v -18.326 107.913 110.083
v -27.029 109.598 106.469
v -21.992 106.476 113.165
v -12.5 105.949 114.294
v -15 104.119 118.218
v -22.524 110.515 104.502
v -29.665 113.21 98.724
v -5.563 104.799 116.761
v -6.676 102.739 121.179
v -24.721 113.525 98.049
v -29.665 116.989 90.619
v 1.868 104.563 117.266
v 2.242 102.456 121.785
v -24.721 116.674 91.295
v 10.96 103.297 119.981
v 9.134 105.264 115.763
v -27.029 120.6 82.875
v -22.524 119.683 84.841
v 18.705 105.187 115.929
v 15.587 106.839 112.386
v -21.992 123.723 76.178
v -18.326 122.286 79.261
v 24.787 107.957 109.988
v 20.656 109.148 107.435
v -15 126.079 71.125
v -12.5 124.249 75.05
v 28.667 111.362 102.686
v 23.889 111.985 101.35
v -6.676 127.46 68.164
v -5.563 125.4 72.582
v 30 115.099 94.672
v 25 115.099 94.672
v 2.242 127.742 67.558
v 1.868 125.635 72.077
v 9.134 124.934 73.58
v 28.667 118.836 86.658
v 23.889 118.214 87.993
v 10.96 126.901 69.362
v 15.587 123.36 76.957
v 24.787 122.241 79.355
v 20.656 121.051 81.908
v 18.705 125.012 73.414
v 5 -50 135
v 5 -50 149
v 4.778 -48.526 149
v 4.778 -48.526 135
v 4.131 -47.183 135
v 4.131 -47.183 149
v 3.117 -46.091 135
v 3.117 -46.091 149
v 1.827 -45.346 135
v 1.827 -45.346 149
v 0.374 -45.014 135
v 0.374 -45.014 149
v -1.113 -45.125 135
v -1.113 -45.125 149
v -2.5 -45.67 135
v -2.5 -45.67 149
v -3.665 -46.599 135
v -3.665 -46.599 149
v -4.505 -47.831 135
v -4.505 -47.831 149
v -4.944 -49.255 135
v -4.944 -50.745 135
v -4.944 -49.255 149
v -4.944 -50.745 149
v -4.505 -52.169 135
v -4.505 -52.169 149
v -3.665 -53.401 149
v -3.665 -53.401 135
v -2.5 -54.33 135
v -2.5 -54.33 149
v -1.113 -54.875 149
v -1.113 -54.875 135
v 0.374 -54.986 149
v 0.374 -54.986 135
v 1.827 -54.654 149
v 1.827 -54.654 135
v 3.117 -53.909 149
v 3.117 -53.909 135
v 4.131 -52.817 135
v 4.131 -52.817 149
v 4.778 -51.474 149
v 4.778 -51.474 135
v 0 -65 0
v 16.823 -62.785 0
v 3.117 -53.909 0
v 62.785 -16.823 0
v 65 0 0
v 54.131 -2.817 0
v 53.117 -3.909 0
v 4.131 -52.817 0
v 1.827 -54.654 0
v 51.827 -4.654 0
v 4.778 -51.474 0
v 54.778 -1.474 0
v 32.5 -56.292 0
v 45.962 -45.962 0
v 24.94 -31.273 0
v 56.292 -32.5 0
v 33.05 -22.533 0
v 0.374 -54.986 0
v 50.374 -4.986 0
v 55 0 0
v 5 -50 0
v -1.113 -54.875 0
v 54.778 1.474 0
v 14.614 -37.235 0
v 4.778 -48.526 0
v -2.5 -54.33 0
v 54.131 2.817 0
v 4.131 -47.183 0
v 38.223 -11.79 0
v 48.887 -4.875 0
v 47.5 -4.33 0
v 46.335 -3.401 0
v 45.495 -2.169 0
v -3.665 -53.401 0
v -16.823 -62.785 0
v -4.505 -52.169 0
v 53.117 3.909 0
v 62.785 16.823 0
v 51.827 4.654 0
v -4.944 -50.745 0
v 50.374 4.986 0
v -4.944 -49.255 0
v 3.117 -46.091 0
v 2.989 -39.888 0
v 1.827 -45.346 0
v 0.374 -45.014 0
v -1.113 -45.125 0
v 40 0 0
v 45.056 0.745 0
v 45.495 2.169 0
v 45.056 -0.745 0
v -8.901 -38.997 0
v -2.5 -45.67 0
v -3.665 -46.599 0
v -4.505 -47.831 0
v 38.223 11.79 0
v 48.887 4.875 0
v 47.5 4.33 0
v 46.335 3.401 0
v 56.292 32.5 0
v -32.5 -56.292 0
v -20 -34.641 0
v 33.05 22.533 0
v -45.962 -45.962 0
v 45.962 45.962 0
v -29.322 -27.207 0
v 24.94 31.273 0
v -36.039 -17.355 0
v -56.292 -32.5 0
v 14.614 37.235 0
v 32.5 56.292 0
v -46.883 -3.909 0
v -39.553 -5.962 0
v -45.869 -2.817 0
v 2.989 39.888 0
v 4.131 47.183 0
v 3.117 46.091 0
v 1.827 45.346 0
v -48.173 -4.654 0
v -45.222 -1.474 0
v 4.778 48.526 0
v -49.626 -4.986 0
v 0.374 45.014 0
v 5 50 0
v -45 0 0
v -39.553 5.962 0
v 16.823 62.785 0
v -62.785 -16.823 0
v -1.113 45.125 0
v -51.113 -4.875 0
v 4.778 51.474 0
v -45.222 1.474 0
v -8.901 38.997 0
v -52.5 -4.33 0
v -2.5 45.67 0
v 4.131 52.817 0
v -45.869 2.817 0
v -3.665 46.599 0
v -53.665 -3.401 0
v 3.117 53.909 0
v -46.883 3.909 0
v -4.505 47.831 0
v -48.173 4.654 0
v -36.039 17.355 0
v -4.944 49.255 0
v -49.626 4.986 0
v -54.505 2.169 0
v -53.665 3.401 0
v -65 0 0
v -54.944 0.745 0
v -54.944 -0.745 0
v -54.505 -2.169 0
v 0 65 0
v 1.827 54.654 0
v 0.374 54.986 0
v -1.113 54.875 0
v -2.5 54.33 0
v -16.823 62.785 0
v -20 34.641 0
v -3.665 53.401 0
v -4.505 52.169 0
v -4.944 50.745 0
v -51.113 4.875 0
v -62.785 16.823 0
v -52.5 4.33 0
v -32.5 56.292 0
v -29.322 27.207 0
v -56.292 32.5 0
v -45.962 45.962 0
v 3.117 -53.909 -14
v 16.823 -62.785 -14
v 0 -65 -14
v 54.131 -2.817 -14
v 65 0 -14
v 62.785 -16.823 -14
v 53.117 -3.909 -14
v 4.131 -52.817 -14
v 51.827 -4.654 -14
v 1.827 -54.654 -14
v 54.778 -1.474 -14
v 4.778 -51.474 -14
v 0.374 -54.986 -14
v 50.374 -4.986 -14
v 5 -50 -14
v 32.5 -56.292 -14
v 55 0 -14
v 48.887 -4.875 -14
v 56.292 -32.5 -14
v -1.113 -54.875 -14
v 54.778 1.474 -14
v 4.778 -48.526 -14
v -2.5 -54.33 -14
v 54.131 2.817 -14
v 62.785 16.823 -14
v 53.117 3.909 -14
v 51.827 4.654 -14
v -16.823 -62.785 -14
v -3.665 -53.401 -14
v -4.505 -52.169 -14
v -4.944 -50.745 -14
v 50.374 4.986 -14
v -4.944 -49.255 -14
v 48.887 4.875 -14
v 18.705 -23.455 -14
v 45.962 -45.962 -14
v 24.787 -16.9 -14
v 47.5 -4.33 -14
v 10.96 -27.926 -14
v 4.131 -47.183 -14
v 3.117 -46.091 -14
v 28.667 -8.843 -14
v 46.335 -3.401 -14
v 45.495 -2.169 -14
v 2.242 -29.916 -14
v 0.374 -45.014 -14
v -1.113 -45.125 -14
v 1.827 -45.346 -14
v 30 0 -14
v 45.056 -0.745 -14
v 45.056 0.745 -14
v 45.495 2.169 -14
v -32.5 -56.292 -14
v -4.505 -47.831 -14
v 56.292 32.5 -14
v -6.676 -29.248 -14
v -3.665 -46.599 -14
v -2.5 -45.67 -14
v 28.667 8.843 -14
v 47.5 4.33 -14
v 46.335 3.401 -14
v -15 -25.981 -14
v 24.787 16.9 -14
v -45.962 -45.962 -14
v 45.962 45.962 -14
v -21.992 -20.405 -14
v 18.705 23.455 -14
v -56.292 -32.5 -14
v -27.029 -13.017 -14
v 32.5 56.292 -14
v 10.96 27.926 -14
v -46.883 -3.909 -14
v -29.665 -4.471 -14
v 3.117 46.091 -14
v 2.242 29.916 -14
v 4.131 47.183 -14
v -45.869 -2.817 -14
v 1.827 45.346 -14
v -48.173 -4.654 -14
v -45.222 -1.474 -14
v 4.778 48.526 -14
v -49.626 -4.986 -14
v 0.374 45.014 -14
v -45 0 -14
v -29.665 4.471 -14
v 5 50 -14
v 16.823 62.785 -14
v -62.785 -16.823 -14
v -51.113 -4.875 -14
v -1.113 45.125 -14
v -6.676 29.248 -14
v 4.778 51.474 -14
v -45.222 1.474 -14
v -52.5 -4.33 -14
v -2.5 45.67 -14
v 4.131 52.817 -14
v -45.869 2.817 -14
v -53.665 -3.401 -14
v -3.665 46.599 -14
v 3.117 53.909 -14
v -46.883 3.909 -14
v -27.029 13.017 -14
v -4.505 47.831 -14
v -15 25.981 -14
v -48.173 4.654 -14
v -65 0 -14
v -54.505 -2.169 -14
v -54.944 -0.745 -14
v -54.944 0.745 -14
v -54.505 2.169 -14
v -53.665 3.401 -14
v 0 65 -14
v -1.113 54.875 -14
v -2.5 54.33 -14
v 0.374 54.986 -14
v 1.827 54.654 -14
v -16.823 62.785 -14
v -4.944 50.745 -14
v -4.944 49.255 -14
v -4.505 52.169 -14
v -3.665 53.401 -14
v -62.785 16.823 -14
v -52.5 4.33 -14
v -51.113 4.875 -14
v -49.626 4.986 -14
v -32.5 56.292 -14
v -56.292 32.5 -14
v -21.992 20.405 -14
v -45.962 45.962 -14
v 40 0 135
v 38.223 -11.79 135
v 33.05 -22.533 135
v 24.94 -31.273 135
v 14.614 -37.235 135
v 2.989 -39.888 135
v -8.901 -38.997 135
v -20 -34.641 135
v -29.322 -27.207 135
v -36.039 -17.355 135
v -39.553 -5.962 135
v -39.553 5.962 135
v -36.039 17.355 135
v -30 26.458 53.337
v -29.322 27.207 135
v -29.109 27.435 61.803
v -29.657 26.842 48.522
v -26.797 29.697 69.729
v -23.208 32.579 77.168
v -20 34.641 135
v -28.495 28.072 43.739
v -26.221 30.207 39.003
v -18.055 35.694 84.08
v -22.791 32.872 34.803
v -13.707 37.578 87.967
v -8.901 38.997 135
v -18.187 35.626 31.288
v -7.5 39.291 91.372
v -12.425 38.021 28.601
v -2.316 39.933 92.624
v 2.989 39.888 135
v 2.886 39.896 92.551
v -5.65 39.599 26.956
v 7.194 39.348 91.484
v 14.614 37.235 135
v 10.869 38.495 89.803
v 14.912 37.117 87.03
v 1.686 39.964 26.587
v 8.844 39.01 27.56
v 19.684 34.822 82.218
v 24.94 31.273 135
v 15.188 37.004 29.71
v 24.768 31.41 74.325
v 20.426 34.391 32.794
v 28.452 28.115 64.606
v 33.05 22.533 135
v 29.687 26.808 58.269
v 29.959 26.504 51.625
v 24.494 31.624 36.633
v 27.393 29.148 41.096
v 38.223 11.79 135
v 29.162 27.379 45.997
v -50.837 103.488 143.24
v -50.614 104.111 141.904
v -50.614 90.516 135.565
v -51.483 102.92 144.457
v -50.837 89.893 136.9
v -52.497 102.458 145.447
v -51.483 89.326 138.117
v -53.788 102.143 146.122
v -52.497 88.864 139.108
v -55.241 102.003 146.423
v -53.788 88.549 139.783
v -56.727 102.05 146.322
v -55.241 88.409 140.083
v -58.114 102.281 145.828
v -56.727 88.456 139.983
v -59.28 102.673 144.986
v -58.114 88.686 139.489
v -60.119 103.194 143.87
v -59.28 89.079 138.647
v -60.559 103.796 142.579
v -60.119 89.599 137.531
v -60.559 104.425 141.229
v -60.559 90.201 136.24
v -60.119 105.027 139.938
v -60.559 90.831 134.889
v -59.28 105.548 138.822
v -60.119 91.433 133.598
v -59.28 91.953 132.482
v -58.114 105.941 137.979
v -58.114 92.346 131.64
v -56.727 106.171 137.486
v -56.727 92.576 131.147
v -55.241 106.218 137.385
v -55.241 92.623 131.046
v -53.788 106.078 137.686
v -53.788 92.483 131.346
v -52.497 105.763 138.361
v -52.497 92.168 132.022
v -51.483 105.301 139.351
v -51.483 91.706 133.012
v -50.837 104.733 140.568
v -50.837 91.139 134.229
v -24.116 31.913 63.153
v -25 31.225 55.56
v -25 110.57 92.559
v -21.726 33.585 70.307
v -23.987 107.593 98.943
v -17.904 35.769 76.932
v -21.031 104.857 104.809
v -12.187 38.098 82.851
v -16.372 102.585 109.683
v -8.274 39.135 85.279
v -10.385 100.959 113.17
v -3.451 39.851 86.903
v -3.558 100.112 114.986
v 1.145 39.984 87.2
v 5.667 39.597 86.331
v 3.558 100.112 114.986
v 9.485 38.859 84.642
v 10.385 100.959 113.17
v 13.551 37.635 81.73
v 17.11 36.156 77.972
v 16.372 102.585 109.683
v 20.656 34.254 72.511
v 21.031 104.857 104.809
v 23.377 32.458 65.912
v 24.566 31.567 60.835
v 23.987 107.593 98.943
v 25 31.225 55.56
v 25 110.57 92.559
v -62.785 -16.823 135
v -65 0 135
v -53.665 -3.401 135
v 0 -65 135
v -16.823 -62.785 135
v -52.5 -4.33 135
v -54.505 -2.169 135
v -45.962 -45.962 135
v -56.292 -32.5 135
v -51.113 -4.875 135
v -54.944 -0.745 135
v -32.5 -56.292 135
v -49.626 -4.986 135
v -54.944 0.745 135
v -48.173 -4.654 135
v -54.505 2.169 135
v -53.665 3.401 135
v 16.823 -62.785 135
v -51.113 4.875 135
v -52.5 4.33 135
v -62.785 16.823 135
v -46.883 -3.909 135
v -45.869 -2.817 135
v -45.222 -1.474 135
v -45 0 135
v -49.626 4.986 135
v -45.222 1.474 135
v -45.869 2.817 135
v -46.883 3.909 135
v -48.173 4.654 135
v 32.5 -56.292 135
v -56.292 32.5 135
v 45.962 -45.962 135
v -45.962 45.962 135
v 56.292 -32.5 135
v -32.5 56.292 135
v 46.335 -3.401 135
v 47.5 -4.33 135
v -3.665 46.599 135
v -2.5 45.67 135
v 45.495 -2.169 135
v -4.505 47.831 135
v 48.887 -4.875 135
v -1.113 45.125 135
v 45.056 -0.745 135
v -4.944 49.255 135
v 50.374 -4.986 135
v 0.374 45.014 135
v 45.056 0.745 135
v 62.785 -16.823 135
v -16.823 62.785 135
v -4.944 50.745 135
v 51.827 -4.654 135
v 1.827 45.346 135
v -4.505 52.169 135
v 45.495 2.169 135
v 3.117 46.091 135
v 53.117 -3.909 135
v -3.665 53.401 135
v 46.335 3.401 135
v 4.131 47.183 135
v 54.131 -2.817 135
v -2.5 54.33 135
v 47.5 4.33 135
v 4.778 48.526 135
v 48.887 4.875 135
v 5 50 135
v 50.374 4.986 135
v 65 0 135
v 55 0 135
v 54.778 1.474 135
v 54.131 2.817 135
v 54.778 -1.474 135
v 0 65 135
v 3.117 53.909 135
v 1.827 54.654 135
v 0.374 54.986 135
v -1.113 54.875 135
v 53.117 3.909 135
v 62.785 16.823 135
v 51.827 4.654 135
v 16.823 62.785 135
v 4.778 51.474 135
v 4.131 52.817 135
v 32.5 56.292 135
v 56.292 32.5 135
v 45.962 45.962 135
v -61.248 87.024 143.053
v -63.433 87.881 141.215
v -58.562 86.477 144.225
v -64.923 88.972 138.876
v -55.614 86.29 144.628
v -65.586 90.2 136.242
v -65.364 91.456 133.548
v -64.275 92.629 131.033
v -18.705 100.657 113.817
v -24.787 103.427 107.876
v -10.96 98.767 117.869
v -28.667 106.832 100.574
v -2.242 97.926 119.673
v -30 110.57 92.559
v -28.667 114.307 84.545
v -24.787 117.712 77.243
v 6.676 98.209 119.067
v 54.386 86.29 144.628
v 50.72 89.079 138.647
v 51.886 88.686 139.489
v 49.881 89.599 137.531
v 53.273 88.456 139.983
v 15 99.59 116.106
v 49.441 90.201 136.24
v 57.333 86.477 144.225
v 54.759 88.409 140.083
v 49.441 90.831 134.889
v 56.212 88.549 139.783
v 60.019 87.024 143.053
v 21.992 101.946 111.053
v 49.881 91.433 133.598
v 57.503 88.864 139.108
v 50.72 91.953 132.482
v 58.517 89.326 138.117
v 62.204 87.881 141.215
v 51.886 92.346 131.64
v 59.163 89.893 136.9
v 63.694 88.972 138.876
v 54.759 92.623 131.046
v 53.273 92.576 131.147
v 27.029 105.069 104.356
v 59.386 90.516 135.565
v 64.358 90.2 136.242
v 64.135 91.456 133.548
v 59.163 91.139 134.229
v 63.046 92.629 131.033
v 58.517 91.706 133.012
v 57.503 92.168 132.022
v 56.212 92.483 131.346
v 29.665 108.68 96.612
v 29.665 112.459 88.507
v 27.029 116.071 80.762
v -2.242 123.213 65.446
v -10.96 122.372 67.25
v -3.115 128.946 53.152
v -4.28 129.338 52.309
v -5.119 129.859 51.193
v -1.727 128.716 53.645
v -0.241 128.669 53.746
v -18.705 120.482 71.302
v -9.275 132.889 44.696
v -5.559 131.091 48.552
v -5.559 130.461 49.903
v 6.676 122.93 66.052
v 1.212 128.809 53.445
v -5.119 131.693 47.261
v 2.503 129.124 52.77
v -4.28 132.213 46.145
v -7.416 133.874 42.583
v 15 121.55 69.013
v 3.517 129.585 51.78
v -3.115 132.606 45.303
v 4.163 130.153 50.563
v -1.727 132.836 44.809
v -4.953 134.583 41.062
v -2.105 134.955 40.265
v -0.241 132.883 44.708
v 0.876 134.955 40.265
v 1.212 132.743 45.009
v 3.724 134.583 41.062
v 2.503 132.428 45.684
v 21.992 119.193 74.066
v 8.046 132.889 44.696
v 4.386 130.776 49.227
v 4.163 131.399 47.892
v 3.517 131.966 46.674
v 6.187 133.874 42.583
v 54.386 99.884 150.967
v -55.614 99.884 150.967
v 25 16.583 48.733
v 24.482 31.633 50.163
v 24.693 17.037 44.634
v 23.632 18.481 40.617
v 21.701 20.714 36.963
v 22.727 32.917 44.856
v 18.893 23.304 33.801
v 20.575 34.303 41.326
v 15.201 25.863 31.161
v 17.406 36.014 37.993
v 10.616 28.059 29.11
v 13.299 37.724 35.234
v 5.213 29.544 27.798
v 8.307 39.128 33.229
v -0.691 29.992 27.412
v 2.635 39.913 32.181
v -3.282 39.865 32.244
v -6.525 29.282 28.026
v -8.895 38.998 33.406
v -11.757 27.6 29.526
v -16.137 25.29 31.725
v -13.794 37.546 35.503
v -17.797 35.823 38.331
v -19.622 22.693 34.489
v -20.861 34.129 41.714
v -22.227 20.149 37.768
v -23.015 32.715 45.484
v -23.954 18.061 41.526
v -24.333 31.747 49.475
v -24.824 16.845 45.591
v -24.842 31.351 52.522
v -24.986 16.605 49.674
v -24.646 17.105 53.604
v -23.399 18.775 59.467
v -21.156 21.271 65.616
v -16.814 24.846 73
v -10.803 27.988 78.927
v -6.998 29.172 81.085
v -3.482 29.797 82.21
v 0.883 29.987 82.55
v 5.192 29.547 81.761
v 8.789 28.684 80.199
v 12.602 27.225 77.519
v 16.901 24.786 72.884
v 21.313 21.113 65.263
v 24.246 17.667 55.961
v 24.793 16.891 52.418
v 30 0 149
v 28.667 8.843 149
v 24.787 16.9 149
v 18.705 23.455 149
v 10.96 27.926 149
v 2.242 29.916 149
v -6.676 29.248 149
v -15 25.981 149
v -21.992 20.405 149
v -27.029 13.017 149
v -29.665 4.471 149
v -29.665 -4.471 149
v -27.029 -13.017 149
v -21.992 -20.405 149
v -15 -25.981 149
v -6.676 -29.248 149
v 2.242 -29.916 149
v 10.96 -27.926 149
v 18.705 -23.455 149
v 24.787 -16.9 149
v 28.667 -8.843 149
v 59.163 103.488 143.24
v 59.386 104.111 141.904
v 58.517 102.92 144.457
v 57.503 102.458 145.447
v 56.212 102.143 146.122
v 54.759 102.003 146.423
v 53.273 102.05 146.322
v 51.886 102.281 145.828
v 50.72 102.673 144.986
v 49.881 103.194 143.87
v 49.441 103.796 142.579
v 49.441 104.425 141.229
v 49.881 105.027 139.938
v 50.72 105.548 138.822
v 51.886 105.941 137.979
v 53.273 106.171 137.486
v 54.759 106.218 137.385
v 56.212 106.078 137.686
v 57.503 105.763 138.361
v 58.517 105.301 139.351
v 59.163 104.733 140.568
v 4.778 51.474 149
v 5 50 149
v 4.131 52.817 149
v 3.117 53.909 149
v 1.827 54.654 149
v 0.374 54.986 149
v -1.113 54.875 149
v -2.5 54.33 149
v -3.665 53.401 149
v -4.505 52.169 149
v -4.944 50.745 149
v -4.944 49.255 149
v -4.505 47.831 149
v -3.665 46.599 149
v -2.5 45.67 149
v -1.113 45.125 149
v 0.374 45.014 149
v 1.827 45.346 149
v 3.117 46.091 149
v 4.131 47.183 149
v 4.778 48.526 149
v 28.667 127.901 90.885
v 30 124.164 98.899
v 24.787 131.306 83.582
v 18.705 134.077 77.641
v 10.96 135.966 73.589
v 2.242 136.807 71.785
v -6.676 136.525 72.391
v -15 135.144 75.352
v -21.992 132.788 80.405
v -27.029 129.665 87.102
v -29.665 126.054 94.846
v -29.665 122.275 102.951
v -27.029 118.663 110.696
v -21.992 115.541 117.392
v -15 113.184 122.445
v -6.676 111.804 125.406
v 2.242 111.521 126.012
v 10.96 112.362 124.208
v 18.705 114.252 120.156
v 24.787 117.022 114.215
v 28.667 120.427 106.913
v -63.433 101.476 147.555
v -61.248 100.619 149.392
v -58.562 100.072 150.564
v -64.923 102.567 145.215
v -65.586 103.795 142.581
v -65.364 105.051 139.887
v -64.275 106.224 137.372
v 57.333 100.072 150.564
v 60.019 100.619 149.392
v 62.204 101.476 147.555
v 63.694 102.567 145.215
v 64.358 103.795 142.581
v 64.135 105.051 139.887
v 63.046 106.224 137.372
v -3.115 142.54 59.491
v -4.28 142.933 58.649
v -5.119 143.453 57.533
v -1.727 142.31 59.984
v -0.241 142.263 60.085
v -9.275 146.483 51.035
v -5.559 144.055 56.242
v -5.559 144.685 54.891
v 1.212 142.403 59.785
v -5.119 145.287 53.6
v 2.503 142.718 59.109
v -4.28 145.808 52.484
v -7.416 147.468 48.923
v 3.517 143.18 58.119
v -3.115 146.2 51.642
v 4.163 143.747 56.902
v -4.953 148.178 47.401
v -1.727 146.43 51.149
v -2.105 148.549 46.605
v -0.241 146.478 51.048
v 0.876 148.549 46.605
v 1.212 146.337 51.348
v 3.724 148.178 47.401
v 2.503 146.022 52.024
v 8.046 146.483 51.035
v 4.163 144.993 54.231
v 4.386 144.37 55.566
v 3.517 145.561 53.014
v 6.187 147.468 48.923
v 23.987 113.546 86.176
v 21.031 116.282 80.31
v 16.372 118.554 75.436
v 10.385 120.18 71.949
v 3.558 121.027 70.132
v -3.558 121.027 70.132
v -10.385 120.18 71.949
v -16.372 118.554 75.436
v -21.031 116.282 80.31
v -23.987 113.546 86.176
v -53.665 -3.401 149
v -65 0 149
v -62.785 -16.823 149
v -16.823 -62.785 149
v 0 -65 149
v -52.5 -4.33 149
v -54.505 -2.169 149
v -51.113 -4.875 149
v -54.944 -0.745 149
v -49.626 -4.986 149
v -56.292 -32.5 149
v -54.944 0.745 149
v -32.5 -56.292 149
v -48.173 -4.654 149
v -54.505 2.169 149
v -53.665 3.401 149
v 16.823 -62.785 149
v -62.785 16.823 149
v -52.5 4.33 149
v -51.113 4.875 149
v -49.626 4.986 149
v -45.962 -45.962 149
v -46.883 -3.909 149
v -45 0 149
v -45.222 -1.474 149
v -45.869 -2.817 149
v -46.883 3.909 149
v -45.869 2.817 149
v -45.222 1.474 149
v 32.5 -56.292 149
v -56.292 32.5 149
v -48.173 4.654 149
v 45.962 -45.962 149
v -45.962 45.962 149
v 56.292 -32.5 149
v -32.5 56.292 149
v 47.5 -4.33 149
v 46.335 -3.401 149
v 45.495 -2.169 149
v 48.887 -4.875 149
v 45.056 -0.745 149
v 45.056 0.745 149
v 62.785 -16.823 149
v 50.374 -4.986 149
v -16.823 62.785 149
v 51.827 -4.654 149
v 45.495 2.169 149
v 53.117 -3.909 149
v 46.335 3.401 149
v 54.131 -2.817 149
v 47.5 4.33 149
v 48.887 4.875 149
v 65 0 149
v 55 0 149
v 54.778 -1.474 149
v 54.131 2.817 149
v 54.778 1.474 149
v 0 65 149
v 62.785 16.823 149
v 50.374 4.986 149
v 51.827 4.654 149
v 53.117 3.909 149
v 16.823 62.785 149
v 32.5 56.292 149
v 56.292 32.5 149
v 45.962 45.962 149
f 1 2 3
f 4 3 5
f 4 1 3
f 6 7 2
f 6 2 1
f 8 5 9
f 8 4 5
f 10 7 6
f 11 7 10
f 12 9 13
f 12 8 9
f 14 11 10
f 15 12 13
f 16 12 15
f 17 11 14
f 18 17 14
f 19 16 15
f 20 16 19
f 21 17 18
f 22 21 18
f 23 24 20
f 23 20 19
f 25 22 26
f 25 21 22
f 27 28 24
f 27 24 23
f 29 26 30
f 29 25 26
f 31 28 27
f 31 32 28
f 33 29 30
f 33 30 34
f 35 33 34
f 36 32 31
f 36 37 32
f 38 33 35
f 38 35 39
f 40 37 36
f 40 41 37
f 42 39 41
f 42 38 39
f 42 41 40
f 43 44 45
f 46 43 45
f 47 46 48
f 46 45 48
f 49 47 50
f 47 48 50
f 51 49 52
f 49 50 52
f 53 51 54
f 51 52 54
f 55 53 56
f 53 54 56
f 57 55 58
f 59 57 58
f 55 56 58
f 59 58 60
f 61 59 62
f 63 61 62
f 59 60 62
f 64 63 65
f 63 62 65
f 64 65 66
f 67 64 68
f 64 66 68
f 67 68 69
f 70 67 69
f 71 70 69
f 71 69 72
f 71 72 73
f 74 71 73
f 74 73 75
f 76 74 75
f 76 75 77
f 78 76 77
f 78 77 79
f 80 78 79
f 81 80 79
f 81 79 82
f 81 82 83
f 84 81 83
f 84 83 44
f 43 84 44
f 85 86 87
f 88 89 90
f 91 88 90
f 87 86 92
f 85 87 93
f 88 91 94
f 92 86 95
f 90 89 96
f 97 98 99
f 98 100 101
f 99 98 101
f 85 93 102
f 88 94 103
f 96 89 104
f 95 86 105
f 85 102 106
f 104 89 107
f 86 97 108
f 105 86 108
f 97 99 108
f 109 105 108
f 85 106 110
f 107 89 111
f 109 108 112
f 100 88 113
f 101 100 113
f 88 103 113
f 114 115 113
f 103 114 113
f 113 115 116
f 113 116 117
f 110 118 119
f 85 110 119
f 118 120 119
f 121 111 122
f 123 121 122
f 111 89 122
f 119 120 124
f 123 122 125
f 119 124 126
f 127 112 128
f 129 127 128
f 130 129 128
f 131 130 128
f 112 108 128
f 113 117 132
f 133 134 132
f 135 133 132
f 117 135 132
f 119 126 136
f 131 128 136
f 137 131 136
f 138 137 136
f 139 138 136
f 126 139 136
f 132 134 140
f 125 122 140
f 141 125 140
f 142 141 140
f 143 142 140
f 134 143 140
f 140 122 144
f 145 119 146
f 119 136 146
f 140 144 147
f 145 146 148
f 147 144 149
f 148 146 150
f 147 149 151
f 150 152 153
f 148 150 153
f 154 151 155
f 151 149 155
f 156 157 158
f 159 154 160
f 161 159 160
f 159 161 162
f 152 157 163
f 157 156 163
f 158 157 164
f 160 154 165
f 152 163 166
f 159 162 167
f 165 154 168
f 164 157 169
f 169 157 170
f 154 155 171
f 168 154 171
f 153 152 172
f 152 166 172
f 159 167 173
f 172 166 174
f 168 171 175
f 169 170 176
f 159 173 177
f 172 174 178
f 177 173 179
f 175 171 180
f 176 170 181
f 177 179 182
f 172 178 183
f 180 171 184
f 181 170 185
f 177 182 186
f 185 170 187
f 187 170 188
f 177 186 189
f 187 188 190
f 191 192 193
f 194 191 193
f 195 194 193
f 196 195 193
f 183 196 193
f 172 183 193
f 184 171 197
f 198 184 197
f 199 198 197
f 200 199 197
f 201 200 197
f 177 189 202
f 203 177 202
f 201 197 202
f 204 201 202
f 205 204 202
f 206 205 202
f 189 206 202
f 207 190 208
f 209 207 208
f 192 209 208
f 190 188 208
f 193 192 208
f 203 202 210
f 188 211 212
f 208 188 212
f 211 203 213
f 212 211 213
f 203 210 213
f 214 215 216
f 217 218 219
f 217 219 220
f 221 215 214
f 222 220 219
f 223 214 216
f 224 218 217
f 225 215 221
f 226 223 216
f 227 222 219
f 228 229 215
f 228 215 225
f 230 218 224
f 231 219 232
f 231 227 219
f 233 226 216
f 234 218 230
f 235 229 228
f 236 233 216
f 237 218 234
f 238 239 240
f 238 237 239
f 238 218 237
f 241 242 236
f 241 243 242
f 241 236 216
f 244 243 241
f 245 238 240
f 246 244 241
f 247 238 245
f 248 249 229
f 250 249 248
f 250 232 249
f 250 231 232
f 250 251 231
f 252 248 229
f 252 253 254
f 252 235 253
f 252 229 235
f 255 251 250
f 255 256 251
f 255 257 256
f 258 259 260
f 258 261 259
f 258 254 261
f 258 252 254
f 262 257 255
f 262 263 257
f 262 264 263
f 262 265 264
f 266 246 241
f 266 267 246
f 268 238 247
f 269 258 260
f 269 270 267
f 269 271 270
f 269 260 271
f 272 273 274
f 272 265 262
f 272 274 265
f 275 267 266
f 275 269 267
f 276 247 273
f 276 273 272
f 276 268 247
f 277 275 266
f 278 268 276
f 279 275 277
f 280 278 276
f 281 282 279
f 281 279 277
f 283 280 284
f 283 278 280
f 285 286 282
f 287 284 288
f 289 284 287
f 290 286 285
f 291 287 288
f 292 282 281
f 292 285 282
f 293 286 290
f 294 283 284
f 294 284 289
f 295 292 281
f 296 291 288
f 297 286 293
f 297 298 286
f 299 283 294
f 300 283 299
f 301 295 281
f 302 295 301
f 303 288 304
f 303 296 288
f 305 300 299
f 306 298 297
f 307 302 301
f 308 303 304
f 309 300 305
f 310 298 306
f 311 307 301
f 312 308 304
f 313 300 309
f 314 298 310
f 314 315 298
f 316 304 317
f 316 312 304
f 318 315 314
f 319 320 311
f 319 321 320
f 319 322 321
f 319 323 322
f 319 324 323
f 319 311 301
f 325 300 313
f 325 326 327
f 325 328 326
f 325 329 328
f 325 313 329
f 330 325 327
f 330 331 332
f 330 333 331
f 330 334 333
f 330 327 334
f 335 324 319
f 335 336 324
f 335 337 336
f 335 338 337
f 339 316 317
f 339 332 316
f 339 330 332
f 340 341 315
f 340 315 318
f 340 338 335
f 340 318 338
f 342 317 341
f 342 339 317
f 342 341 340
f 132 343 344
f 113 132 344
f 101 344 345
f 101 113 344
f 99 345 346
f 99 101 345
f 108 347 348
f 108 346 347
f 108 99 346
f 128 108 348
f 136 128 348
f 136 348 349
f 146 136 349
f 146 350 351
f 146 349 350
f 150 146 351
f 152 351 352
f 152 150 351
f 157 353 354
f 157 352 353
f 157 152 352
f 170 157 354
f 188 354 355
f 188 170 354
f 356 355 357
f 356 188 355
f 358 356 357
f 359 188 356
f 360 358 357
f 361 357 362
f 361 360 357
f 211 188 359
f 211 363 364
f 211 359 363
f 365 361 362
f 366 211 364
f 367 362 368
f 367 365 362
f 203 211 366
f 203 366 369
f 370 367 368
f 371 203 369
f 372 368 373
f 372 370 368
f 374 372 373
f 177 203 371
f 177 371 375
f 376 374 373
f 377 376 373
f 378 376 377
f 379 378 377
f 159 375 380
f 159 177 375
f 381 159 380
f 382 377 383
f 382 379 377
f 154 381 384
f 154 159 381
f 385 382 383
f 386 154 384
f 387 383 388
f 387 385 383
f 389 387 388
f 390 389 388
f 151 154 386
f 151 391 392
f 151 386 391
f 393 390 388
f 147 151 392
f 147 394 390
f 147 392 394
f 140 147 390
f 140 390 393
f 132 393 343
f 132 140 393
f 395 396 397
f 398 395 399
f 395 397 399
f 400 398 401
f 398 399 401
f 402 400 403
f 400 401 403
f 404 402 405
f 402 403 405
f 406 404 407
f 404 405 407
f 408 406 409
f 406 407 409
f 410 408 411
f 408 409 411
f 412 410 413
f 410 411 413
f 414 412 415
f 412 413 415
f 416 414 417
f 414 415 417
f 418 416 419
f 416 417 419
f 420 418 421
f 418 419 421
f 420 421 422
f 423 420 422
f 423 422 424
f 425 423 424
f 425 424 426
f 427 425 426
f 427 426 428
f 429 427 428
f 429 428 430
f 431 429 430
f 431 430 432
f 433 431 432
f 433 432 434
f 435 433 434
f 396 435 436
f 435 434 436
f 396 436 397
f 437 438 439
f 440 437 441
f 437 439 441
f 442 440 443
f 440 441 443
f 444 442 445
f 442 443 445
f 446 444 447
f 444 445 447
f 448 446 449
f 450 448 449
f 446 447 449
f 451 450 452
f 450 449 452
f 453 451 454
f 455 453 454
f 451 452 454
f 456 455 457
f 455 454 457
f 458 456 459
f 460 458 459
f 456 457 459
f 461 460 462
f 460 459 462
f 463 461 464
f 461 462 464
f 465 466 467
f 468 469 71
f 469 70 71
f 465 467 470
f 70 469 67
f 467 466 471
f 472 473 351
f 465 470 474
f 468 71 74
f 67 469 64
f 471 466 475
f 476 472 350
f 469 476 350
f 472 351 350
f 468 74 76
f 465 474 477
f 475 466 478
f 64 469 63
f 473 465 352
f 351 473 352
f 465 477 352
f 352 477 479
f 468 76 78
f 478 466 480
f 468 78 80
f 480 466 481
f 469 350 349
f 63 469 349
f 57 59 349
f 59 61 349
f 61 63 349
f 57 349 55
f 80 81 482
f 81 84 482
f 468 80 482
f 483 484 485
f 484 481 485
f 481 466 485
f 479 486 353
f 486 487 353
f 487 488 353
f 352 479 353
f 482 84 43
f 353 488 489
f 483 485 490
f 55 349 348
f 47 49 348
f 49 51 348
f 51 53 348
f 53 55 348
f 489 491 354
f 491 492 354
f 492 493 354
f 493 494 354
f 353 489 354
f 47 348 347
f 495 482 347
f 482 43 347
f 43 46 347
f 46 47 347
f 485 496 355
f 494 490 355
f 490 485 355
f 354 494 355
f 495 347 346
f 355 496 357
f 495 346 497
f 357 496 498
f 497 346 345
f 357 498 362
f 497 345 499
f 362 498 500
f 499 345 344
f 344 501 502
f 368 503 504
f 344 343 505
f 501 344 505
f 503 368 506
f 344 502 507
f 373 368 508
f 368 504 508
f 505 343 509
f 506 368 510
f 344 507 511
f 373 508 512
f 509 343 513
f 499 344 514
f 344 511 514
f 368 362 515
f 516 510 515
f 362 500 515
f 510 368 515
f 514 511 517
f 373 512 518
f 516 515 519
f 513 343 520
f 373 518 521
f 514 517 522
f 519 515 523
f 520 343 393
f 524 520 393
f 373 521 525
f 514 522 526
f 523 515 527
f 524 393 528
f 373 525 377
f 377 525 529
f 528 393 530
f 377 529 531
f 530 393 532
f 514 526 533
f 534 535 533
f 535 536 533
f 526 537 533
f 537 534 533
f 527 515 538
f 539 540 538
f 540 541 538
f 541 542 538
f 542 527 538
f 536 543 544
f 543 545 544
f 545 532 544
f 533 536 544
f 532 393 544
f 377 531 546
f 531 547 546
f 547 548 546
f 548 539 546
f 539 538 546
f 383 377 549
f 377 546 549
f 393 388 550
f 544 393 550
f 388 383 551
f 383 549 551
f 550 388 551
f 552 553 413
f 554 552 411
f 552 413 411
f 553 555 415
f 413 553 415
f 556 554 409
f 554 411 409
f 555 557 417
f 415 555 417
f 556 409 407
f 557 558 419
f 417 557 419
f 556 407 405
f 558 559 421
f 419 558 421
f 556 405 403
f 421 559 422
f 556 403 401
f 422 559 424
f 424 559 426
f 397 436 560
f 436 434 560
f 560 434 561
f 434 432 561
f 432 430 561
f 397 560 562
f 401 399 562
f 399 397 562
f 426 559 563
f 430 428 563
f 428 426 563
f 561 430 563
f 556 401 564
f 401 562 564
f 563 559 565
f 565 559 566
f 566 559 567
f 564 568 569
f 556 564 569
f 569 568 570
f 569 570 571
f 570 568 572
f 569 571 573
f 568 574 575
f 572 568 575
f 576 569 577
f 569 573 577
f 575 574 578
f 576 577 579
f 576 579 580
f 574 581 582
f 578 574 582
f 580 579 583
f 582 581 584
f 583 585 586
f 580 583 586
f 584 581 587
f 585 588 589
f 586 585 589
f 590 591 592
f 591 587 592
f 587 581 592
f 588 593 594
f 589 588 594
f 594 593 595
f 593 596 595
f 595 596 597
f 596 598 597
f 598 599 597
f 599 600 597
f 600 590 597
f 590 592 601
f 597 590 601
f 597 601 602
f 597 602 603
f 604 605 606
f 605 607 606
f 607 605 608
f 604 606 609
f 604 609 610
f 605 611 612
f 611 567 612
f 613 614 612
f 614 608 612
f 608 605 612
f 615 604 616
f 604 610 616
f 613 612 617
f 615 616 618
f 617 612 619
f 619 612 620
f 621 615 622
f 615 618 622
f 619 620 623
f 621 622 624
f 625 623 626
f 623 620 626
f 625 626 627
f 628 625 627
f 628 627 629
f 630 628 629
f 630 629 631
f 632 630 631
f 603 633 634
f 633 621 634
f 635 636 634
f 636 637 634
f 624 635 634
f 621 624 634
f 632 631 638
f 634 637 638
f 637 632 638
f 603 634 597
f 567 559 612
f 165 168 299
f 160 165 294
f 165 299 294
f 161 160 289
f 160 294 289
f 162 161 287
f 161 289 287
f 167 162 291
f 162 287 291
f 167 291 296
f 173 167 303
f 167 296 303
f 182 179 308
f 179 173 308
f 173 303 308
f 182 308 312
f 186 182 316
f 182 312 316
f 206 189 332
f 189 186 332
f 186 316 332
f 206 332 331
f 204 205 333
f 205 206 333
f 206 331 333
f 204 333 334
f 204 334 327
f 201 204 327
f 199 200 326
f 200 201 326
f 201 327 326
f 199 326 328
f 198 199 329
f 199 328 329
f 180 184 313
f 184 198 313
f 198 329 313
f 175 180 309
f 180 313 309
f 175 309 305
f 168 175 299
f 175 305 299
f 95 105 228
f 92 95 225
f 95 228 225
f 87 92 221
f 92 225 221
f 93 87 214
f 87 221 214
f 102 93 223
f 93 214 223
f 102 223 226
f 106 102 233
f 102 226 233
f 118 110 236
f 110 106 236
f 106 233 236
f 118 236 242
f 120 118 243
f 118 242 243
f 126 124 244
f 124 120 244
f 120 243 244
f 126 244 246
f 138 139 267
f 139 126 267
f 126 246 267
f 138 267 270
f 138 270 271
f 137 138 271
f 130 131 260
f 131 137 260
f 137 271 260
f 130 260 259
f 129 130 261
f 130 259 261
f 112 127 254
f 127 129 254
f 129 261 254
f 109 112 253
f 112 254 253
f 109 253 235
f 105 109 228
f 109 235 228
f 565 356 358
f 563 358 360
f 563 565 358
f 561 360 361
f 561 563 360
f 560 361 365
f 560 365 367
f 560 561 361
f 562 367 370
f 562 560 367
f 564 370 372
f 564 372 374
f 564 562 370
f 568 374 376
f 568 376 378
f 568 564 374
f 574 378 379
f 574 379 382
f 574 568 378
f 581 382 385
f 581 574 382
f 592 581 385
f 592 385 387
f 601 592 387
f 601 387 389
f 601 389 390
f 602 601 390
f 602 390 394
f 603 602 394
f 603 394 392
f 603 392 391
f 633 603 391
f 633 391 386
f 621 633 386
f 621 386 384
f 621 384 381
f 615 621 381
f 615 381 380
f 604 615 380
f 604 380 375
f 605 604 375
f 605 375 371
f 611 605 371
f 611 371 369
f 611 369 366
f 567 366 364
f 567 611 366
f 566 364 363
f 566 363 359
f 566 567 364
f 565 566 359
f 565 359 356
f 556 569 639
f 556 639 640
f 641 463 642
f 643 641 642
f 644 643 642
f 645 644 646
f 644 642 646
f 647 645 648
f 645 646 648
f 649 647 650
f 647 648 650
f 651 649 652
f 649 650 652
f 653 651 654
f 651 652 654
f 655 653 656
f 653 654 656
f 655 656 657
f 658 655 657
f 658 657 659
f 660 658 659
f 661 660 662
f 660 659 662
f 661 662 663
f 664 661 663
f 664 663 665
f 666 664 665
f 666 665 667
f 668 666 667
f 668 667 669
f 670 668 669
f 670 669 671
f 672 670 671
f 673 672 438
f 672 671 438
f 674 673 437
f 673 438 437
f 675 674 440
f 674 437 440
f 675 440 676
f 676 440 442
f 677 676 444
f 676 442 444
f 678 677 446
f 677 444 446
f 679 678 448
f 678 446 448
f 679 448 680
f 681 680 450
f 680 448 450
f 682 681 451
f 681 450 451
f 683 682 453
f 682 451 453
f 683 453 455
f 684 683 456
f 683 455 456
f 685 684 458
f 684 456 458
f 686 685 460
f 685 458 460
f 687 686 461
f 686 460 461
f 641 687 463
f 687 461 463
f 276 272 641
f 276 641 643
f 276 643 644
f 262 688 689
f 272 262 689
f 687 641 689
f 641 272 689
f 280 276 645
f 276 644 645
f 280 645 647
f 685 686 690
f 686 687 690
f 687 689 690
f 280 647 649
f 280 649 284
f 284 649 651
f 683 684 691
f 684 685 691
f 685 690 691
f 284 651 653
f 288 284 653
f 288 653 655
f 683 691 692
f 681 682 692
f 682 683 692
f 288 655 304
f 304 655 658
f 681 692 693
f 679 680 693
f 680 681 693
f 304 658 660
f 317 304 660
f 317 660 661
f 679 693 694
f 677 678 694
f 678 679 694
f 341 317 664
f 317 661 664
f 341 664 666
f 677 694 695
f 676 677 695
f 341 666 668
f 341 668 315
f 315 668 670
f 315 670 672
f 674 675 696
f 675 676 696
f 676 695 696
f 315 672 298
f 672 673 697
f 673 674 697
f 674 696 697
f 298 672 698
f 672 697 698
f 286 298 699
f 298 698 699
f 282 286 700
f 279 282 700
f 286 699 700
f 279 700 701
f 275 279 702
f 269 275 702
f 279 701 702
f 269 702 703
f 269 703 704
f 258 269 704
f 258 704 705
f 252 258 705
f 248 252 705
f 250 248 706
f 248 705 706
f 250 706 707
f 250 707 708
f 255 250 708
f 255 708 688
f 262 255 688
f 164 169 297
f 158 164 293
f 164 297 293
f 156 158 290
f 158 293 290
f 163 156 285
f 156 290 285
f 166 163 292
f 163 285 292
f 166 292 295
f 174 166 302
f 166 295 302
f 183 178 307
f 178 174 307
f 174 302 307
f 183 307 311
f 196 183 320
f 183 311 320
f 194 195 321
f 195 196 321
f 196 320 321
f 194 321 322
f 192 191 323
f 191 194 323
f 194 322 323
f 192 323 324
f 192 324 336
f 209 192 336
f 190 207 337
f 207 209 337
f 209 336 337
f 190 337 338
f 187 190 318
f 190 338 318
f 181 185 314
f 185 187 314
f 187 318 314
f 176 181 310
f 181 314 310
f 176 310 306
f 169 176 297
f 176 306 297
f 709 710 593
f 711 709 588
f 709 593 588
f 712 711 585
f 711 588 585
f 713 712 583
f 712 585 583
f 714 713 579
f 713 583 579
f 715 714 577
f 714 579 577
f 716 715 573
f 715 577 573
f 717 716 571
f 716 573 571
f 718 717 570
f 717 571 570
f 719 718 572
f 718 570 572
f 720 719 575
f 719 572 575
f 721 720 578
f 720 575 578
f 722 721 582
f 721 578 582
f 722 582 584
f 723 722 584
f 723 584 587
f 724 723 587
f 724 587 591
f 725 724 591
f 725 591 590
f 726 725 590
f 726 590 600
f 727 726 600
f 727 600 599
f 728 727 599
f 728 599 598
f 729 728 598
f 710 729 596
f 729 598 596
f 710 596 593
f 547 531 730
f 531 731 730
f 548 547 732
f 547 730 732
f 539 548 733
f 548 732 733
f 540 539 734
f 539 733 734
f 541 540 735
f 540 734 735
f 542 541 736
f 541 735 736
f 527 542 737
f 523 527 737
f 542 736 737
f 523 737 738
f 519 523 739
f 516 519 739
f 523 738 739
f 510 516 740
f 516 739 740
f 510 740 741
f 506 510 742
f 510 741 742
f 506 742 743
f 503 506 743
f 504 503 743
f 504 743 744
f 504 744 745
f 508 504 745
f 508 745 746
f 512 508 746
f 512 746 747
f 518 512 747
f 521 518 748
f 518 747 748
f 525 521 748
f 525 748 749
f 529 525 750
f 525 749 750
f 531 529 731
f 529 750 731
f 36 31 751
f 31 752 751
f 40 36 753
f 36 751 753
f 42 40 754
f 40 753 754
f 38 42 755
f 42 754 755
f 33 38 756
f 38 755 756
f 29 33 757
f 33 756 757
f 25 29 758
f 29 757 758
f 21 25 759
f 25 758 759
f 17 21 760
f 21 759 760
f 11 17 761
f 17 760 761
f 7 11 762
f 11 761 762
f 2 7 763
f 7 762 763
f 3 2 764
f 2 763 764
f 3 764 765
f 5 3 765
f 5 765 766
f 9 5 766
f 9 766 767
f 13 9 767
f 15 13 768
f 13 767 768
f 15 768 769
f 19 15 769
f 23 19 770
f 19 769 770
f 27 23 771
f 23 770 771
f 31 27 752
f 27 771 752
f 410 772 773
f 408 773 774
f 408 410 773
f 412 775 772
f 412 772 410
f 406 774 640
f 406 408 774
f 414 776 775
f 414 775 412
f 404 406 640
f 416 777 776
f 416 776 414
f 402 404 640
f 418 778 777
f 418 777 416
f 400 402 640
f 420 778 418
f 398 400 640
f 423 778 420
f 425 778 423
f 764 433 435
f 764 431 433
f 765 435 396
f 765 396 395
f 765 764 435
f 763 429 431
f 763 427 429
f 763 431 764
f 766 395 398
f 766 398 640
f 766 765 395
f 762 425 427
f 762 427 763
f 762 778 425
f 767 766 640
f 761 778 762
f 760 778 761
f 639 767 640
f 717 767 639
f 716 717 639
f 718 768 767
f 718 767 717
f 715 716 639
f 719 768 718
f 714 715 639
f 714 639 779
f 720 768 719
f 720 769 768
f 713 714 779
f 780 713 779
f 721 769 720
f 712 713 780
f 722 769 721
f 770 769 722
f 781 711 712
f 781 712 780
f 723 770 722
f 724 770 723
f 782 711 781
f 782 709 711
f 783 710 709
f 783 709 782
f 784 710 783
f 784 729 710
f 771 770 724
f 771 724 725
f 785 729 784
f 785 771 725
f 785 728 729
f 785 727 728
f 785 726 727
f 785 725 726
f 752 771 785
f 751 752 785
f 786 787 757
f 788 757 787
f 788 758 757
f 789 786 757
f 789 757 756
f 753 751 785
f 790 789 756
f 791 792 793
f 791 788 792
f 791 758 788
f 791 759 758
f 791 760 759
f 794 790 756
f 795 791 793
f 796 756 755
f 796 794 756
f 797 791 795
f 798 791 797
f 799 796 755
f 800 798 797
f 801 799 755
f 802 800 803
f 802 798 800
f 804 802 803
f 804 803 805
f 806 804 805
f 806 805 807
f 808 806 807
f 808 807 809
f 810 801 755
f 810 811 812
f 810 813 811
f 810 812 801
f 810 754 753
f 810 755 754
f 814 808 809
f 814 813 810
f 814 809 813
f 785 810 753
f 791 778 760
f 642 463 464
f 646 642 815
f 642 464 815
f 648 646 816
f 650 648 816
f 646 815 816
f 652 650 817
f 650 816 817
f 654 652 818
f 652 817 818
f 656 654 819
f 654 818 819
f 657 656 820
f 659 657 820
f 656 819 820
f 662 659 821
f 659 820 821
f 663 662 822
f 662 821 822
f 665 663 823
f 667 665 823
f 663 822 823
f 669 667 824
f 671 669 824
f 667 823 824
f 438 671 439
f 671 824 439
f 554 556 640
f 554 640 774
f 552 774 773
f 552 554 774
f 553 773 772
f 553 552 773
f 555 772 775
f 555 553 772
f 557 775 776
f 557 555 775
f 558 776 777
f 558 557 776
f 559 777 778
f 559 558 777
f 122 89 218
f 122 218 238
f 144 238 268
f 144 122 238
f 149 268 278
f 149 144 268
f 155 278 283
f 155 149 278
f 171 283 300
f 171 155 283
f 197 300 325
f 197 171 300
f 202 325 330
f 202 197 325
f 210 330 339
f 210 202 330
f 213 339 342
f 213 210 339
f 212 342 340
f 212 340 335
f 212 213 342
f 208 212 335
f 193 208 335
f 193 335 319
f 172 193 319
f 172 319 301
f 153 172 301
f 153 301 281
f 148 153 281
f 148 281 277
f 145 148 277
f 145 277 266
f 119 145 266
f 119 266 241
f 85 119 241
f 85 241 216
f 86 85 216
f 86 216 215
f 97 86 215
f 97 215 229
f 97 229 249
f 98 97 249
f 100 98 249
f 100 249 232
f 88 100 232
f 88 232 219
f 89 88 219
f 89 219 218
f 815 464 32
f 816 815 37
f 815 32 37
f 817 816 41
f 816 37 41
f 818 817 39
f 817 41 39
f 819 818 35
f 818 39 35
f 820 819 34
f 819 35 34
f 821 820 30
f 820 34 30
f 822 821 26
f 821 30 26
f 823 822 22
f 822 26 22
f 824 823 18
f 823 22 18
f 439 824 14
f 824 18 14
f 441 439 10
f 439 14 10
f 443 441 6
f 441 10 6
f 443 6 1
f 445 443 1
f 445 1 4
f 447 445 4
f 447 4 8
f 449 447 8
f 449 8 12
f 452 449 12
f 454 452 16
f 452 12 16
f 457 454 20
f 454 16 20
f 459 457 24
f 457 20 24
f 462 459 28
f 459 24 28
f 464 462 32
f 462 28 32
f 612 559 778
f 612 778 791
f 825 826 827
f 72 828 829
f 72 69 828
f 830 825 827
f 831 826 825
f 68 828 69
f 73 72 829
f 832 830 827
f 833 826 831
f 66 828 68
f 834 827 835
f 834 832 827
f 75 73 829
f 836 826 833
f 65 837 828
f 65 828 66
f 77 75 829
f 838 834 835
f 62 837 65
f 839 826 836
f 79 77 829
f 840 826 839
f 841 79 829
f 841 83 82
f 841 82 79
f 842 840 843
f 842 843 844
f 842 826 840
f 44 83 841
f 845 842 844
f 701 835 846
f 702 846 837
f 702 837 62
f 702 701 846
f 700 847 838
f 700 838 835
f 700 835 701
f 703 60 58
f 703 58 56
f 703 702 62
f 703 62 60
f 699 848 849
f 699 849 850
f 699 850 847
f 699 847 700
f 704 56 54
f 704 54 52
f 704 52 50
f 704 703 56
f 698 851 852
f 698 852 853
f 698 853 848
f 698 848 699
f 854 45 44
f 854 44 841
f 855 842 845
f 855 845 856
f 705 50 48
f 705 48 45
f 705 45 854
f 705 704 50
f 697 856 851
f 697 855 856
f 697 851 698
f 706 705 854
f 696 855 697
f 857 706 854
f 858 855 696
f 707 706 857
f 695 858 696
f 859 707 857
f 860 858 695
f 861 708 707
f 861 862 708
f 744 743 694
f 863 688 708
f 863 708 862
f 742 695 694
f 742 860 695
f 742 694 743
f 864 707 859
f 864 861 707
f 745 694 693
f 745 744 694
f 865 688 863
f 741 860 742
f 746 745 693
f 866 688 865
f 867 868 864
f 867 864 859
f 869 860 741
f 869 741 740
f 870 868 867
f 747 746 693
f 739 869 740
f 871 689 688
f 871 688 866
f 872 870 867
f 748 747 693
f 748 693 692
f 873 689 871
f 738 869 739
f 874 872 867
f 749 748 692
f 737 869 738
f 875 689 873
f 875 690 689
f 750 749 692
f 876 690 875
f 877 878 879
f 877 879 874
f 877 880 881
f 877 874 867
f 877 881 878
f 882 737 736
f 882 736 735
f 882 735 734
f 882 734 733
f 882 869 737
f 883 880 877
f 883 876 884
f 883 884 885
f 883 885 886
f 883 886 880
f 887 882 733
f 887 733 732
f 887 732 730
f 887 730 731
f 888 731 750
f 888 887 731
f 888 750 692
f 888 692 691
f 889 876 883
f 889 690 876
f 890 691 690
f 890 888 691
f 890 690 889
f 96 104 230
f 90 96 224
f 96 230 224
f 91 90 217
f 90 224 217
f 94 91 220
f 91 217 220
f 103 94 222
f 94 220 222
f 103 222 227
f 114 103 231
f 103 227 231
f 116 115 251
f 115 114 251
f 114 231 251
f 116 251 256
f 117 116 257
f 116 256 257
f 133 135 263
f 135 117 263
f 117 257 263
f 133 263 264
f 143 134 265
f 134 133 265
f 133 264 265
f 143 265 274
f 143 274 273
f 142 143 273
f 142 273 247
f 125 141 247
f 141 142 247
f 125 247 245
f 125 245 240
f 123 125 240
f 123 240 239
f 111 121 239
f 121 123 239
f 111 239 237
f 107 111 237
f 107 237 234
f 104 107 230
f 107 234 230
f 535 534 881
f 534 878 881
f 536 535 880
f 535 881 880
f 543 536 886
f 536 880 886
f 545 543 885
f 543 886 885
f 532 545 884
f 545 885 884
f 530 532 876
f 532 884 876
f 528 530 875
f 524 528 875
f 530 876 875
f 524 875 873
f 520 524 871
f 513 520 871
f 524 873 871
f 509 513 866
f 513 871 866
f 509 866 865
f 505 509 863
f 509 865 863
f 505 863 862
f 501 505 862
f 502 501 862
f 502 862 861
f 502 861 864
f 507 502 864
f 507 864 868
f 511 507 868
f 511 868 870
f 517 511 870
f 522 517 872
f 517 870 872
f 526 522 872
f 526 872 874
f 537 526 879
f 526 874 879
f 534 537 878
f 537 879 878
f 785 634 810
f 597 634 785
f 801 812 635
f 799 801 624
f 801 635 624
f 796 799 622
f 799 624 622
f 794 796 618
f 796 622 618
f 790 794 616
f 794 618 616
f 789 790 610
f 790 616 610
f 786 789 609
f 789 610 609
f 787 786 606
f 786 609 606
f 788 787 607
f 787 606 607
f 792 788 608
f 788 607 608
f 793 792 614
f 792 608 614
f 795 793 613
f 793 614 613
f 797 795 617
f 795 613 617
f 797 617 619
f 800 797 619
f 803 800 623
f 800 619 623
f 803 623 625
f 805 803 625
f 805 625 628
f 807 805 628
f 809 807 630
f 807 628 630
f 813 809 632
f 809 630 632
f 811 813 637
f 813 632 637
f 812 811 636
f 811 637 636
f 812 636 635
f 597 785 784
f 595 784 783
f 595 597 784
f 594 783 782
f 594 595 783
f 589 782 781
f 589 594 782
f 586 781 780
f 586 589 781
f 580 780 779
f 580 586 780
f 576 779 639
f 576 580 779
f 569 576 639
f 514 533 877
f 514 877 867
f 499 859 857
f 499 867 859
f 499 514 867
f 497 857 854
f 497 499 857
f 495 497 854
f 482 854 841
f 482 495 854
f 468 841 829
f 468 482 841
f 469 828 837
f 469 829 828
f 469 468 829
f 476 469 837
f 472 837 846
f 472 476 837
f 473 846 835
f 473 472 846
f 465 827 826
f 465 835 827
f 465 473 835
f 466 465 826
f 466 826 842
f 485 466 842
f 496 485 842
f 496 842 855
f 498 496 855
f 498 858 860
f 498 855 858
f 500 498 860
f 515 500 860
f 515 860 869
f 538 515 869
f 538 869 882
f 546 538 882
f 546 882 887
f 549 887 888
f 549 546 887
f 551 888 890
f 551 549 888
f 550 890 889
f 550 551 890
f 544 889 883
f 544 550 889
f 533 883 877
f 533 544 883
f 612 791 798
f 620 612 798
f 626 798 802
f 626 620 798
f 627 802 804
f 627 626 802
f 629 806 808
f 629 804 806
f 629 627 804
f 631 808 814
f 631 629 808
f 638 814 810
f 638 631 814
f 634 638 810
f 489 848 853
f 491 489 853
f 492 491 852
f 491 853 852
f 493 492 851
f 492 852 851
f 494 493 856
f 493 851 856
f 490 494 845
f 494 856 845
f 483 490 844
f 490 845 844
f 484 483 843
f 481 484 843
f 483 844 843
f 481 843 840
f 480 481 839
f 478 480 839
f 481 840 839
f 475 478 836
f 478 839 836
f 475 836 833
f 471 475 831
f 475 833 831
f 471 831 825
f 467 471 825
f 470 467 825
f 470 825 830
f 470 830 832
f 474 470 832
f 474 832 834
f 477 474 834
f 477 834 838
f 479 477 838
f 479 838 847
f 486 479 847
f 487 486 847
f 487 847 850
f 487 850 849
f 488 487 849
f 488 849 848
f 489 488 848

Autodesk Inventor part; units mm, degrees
ref_plane "YZ Plane" through (0, 0, 0) normal (1, 0, 0) x (0, 1, 0)
sketch "Sketch1" plane through (0, 0, 0) normal (0, 0, 1) x (1, 0, 0)
  circle A0 centre (0, 0) radius 40
  circle A1 centre (0, 0) radius 30
  dimension "d0" = 80
  dimension "d1" = 60
extrude "Extrusion1" add sketch "Sketch1" along normal blind 135
sketch "Sketch2" plane through (0, 0, 135) normal (0, 0, 1) x (1, 0, 0)
  circle A0 centre (0, 0) radius 65
  circle A1 centre (0, 0) radius 30
  dimension "d4" = 130
extrude "Extrusion2" add sketch "Sketch2" along normal blind 14
sketch "Sketch3" plane through (0, 0, 0) normal (0, 0, -1) x (-1, 0, 0)
  point P0 (0, 0)
sketch "Sketch4" plane through (0, 0, 149) normal (0, 0, 1) x (1, 0, 0)
  circle A0 centre (0, 0) radius 50
  circle A1 centre (-50, 0) radius 5
  circle A2 centre (0, -50) radius 5
  circle A3 centre (50, 0) radius 5
  circle A4 centre (0, 50) radius 5
  dimension "d7" = 100
  dimension "d8" = 10
  dimension "d11" = 360
extrude "Extrusion3" cut sketch "Sketch4" against normal blind 14 contours A0 A3 | A0 A3 | A4 A0 | A0 A4 | A2 A0 | A0 A2 | A1 A0 | A0 A1
ref_plane "Work Plane1" through (0, 0, 67.5) normal (0, 0, 1) x (1, 0, 0)
mirror "Mirror1" about plane through (0, 0, 67.5) normal (0, 0, 1) of "Extrusion2", "Extrusion3"
ref_plane "Work Plane2" through (0, 0, 94) normal (0, 0, 1) x (1, 0, 0)
sketch "Sketch5" plane through (0, 0, 94) normal (0, 0, 1) x (1, 0, 0)
  circle A0 centre (0, 0) radius 30 projected
  line L0 (-30, 0) -> (30, 0)
ref_plane "Work Plane3" through (-30, 0, 94) normal (0, -0.4226, 0.9063) x (1, 0, 0)
sketch "Sketch6" plane through (0, 0, 0) normal (1, 0, 0) x (0, 1, 0)
  point P0 (0, 0)
sketch "Sketch7" plane through (-30, 0, 94) normal (0, -0.4226, 0.9063) x (1, 0, 0)
  point P0 (30, -39.7261)
sketch "Sketch8" plane through (-30, 0, 94) normal (0, -0.4226, 0.9063) x (1, 0, 0)
  point P0 (30, -39.7261)
sketch "Sketch9" plane through (0, 0, 94) normal (0, 0, 1) x (1, 0, 0)
  point P0 (0, 0)
sketch "Sketch10" plane through (-30, 0, 94) normal (0, -0.4226, 0.9063) x (1, 0, 0)
  point P0 (30, -39.7261)
sketch "Sketch11" plane through (0, 0, 0) normal (1, 0, 0) x (0, 1, 0)
  line L0 (5, -14) -> (-5, -14) construction
  line L1 (0, -14) -> (0, 41) construction
  line L2 (0, 41) -> (115.1011, 94.6725) construction
  point P0 (0, 0)
  dimension "d18" = 127
  dimension "d19" = 115
  dimension "d20" = 55
ref_plane "Work Plane4" through (0, 115.1011, 94.6725) normal (0, 0.9063, 0.4226) x (-1, 0, 0)
sketch "Sketch12" plane through (0, 115.1011, 94.6725) normal (0, 0.9063, 0.4226) x (-1, 0, 0)
  circle A0 centre (0, 0) radius 30
  circle A1 centre (0, 0) radius 25
  point P0 (0, -37.1586)
  dimension "d21" = 60
  dimension "d22" = 50
extrude "Extrusion4" add sketch "Sketch12" against normal up to next
sketch "Sketch13" plane through (0, 115.1011, 94.6725) normal (0, 0.9063, 0.4226) x (1, 0, 0)
  line L0 (54.3855, -57.451) -> (-55.6145, -57.451)
  line L1 (-64.2747, -42.451) -> (-9.2747, 52.8118)
  line L2 (8.0458, 52.8118) -> (63.0458, -42.451)
  arc A0 (54.3855, -57.451) -> (63.0458, -42.451) centre (54.3855, -47.451) ccw
  arc A1 (-64.2747, -42.451) -> (-55.6145, -57.451) centre (-55.6145, -47.451) ccw
  arc A2 (8.0458, 52.8118) -> (-9.2747, 52.8118) centre (-0.6145, 47.8118) ccw
  line L3 (54.3855, -47.451) -> (-55.6145, -47.451) construction
  circle A3 centre (54.3855, -47.451) radius 5
  circle A4 centre (-55.6145, -47.451) radius 5
  circle A5 centre (-0.6145, 47.8118) radius 5
  line L4 (-0.6145, -57.451) -> (-0.6145, -2.451) construction
  point P0 (0, 37.1586)
  dimension "d25" = 10
  dimension "d26" = 110
  dimension "d28" = 10
  dimension "d29" = 10
  dimension "d30" = 10
  dimension "d31" = 55
extrude "Extrusion5" add sketch "Sketch13" along normal blind 10 and the other way blind 5
sketch "Sketch14" plane through (0, 124.1642, 98.8987) normal (0, 0.9063, 0.4226) x (1, 0, 0)
  circle A0 centre (0, 0) radius 25 projected
  circle A1 centre (0, 0) radius 30
  point P0 (0, 37.1586)
extrude "Extrusion6" cut sketch "Sketch14" against normal blind 10 contours A0 | A1
sketch "Sketch15" plane through (0, 115.1011, 94.6725) normal (0, 0.9063, 0.4226) x (1, 0, 0)
  circle A0 centre (0, 0) radius 30 projected
  circle A1 centre (0, 0) radius 25
  point P0 (0, 37.1586)
  dimension "d38" = 50
extrude "Extrusion7" cut sketch "Sketch15" against normal blind 120 contours A1
properties part number "cad@63"
